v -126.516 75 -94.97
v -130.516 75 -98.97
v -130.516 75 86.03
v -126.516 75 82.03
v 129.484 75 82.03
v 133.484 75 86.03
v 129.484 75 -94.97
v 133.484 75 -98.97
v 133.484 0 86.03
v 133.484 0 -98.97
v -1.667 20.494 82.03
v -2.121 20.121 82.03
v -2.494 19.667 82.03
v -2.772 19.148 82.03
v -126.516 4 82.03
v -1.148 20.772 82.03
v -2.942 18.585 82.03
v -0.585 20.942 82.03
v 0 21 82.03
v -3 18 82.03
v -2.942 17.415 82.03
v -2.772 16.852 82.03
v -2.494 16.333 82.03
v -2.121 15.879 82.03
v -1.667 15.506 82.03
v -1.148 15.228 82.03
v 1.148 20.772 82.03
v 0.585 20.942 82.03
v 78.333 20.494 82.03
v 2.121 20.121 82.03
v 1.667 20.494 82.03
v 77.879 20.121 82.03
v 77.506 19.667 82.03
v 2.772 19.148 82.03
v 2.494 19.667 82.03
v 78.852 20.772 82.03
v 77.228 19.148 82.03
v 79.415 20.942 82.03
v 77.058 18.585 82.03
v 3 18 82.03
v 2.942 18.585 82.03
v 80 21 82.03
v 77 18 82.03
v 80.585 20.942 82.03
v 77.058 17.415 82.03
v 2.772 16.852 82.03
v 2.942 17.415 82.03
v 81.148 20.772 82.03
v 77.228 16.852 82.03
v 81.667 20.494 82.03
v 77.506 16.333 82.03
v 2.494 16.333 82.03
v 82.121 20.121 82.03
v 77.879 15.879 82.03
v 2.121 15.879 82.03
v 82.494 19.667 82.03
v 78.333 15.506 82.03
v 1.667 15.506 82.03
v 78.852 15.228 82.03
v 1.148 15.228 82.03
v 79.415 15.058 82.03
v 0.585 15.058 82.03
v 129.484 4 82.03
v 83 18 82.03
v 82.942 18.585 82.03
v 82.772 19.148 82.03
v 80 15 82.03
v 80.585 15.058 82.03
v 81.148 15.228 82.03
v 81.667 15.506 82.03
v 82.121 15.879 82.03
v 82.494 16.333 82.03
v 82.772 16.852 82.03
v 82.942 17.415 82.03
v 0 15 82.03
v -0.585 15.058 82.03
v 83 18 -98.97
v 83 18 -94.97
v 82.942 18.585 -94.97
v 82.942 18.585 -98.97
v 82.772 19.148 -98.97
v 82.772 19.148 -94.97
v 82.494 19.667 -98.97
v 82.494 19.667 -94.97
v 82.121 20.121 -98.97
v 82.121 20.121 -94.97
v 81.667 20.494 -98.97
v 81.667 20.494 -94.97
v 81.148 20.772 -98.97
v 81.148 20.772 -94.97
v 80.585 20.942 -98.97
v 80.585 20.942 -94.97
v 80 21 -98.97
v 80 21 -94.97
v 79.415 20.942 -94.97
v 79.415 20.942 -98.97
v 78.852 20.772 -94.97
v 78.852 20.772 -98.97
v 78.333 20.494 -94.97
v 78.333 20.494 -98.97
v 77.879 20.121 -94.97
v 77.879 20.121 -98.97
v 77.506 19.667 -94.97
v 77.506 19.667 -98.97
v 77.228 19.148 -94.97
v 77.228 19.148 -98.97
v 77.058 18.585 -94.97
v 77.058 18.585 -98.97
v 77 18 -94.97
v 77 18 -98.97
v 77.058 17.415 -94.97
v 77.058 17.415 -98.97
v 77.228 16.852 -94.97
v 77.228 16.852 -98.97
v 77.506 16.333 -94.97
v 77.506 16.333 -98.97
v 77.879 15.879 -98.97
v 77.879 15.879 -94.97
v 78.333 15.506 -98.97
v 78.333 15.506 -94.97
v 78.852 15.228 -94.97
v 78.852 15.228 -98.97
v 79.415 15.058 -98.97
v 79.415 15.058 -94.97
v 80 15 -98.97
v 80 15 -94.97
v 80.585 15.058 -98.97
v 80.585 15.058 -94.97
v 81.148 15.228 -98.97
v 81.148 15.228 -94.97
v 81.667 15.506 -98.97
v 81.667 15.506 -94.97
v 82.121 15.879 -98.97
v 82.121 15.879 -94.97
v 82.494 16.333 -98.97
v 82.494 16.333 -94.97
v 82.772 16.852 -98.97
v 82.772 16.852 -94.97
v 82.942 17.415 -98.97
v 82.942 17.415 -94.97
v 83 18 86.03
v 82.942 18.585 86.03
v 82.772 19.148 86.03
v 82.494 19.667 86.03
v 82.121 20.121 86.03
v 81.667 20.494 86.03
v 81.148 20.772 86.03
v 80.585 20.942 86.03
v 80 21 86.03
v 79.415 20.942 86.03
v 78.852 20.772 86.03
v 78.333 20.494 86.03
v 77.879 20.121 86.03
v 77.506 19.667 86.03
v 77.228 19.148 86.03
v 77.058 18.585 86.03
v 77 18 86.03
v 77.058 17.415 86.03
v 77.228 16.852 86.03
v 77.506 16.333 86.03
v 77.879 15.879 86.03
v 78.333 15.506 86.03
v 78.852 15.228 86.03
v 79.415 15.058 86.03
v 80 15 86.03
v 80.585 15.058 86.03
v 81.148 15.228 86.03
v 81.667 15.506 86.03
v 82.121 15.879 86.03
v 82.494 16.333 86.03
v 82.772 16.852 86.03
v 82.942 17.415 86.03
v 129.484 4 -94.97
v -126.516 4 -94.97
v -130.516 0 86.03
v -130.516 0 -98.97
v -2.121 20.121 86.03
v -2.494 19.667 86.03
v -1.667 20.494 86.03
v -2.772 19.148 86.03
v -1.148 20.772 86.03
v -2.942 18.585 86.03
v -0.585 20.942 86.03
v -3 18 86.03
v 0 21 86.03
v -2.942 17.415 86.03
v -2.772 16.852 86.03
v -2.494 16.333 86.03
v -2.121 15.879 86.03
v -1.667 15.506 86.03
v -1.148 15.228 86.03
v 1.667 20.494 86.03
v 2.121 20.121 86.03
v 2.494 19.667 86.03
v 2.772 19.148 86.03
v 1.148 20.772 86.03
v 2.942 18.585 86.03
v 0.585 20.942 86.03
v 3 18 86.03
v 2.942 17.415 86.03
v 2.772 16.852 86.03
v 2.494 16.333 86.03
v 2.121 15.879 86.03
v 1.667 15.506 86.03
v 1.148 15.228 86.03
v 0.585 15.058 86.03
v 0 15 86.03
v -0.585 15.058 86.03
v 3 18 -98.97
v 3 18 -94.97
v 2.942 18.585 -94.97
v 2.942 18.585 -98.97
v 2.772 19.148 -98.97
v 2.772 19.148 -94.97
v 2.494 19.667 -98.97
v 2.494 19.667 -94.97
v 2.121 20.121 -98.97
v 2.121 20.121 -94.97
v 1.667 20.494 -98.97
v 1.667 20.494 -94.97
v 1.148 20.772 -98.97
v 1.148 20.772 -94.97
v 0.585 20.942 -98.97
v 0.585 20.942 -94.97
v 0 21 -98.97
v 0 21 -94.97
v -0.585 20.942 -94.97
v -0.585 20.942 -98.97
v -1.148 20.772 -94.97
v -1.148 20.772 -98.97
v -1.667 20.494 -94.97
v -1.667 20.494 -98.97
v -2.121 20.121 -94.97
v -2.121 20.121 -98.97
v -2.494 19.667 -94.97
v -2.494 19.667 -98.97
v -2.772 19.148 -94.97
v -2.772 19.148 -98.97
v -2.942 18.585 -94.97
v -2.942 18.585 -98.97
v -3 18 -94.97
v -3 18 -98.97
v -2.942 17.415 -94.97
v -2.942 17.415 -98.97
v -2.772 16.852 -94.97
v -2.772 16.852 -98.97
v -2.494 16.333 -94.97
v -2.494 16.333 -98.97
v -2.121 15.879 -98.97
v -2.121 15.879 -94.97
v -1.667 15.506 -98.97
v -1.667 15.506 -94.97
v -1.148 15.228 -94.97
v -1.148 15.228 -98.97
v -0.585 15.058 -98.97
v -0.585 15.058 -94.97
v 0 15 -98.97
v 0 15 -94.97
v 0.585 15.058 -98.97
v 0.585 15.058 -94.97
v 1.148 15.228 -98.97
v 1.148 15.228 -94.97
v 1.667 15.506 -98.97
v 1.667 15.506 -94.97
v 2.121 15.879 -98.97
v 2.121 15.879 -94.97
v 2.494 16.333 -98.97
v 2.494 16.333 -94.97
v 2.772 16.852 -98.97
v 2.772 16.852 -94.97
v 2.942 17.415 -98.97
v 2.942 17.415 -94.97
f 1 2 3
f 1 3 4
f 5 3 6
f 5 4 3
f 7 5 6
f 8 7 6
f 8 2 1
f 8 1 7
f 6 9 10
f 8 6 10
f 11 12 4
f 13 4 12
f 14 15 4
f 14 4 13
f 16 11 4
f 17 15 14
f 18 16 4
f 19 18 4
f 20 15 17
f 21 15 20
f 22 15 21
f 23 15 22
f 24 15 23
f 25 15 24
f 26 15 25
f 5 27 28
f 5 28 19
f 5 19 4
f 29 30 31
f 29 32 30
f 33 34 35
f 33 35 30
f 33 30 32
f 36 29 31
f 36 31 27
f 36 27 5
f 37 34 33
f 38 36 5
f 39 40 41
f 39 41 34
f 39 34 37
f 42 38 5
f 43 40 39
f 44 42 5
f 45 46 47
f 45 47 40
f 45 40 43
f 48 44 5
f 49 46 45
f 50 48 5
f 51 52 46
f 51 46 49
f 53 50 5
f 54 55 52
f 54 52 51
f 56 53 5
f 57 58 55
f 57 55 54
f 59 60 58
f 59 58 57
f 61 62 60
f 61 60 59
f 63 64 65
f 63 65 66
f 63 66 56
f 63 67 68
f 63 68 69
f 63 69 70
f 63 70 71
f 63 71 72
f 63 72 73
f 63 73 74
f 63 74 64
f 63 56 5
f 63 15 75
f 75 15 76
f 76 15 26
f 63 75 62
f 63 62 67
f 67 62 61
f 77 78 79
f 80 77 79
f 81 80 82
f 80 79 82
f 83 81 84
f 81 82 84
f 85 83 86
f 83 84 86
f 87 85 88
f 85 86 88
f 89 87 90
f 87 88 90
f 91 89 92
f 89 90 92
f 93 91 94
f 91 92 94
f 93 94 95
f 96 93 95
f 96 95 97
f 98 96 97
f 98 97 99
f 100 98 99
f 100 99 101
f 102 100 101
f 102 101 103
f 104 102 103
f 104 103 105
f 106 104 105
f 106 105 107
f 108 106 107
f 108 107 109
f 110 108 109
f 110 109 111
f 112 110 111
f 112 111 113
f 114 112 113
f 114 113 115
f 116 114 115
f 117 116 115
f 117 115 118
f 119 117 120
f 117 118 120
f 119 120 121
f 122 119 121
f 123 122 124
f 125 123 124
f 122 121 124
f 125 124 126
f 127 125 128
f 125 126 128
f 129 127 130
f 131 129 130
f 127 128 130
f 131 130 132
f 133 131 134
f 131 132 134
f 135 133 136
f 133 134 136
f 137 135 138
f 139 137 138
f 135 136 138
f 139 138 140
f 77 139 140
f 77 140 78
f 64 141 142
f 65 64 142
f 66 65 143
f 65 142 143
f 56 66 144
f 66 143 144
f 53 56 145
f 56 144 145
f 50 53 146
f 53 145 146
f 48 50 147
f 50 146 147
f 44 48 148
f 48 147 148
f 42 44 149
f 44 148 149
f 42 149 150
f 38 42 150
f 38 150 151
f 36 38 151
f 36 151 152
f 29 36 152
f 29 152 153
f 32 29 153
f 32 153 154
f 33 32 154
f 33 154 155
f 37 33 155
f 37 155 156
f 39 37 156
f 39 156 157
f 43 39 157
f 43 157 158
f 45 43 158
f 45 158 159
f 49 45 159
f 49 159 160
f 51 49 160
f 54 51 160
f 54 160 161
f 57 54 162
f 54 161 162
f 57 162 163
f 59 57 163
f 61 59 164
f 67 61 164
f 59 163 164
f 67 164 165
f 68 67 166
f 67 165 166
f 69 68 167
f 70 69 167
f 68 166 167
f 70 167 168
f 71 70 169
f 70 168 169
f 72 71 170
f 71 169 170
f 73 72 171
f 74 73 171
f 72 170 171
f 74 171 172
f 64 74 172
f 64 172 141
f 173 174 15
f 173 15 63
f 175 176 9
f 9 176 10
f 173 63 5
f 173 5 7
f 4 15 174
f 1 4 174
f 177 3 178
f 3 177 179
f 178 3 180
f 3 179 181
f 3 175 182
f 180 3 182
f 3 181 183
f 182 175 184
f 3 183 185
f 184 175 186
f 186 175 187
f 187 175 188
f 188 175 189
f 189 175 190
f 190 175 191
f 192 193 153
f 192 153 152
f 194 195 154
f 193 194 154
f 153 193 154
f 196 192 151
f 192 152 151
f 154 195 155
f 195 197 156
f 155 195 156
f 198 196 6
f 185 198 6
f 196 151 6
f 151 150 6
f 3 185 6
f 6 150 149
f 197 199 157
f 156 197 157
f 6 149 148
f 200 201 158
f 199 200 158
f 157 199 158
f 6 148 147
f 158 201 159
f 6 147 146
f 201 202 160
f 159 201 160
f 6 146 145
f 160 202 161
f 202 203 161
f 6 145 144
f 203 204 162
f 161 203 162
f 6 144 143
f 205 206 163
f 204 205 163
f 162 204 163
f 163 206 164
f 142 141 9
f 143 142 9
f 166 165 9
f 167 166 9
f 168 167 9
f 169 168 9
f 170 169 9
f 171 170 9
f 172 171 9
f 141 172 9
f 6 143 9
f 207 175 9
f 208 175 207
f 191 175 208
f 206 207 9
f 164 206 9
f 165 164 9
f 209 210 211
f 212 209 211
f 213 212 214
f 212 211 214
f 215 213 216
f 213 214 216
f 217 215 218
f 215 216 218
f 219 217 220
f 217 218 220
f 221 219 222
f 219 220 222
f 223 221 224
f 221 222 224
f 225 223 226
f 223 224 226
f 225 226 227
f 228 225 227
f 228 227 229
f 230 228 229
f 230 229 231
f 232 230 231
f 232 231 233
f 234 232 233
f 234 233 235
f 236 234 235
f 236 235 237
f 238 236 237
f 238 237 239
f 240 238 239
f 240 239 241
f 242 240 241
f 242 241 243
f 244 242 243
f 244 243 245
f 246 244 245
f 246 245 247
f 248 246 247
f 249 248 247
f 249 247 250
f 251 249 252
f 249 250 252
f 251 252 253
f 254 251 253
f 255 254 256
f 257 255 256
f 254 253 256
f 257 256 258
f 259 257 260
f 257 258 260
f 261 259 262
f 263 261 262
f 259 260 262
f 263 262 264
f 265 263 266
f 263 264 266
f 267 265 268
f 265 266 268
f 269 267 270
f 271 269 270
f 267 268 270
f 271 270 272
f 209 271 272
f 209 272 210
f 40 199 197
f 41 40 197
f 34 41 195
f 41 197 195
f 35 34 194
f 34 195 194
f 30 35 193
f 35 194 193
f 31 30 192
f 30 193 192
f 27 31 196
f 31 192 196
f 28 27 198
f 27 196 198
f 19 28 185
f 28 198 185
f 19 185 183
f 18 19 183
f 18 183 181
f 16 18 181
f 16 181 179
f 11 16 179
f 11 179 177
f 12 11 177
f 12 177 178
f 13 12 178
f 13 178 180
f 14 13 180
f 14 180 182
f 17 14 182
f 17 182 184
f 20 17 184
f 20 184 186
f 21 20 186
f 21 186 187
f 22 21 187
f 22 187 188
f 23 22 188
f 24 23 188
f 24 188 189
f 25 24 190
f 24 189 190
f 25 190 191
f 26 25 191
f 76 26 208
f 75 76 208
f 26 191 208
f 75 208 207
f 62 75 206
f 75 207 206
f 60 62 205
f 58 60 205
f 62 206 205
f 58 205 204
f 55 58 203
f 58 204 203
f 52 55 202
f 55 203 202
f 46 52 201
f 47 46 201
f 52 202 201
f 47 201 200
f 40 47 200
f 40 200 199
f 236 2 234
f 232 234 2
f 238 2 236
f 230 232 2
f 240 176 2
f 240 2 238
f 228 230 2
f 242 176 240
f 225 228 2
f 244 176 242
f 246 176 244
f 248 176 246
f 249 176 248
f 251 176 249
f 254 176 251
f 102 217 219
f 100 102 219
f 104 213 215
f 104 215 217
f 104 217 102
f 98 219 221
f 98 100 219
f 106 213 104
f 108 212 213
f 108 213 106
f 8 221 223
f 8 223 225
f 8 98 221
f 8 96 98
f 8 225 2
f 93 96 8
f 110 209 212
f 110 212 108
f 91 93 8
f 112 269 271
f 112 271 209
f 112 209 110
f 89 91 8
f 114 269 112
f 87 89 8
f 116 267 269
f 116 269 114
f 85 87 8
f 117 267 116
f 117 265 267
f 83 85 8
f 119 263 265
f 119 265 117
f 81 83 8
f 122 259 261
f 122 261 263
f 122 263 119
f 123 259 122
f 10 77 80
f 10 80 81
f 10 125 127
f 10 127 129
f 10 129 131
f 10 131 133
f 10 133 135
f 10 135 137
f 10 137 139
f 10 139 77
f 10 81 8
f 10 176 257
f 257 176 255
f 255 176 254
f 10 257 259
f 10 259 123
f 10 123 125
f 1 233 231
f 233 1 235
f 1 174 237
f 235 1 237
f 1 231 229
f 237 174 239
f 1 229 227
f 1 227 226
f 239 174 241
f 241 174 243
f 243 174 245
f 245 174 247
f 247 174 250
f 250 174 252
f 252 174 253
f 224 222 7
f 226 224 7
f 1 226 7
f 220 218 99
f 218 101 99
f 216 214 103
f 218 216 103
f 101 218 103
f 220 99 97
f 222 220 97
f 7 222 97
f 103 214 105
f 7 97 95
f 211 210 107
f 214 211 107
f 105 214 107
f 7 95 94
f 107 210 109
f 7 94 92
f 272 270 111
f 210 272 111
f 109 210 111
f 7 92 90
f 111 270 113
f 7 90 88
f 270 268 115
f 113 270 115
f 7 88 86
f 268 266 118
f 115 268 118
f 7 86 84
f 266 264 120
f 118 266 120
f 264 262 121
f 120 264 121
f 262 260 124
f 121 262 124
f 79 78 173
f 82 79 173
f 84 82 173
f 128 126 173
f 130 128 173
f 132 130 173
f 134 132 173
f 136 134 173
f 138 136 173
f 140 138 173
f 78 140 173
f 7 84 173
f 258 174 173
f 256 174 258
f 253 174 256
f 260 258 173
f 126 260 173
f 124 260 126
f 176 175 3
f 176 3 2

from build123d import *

# Parameters (mm, degrees)
SKETCH1_W           = 264
SKETCH1_H           = 185
SKETCH1_W_2         = 256
SKETCH1_H_2         = 177
BOSS_EXTRUDE4_DEPTH = 75
SKETCH6_W           = 256
SKETCH6_H           = 4
BOSS_EXTRUDE5_DEPTH = 177
SKETCH7_R           = 3
CUT_EXTRUDE1_DEPTH  = 185


with BuildPart() as part:
    # Sketch1 → Boss-Extrude4 (new body)
    with BuildSketch(Plane(origin=(0, 0, 0), x_dir=(1, 0, 0), z_dir=(0, 1, 0))):
        with Locations((1.484105733, 6.470202951)):
            Rectangle(SKETCH1_W, SKETCH1_H)
        with Locations((1.484105733, 6.470202951)):
            Rectangle(SKETCH1_W_2, SKETCH1_H_2, mode=Mode.SUBTRACT)
    extrude(amount=BOSS_EXTRUDE4_DEPTH)

    # Sketch6 → Boss-Extrude5 (add)
    with BuildSketch(Plane.XY.offset(-94.970202951)):
        with Locations((1.484105733, 2)):
            Rectangle(SKETCH6_W, SKETCH6_H)
    extrude(amount=BOSS_EXTRUDE5_DEPTH)

    # Sketch7 → Cut-Extrude1 (cut)
    with BuildSketch(Plane.XY.offset(86.029797049)):
        with Locations((0, 18)):
            Circle(SKETCH7_R)
        with Locations((80, 18)):
            Circle(SKETCH7_R)
    extrude(amount=-CUT_EXTRUDE1_DEPTH, mode=Mode.SUBTRACT)


solid = part.part
